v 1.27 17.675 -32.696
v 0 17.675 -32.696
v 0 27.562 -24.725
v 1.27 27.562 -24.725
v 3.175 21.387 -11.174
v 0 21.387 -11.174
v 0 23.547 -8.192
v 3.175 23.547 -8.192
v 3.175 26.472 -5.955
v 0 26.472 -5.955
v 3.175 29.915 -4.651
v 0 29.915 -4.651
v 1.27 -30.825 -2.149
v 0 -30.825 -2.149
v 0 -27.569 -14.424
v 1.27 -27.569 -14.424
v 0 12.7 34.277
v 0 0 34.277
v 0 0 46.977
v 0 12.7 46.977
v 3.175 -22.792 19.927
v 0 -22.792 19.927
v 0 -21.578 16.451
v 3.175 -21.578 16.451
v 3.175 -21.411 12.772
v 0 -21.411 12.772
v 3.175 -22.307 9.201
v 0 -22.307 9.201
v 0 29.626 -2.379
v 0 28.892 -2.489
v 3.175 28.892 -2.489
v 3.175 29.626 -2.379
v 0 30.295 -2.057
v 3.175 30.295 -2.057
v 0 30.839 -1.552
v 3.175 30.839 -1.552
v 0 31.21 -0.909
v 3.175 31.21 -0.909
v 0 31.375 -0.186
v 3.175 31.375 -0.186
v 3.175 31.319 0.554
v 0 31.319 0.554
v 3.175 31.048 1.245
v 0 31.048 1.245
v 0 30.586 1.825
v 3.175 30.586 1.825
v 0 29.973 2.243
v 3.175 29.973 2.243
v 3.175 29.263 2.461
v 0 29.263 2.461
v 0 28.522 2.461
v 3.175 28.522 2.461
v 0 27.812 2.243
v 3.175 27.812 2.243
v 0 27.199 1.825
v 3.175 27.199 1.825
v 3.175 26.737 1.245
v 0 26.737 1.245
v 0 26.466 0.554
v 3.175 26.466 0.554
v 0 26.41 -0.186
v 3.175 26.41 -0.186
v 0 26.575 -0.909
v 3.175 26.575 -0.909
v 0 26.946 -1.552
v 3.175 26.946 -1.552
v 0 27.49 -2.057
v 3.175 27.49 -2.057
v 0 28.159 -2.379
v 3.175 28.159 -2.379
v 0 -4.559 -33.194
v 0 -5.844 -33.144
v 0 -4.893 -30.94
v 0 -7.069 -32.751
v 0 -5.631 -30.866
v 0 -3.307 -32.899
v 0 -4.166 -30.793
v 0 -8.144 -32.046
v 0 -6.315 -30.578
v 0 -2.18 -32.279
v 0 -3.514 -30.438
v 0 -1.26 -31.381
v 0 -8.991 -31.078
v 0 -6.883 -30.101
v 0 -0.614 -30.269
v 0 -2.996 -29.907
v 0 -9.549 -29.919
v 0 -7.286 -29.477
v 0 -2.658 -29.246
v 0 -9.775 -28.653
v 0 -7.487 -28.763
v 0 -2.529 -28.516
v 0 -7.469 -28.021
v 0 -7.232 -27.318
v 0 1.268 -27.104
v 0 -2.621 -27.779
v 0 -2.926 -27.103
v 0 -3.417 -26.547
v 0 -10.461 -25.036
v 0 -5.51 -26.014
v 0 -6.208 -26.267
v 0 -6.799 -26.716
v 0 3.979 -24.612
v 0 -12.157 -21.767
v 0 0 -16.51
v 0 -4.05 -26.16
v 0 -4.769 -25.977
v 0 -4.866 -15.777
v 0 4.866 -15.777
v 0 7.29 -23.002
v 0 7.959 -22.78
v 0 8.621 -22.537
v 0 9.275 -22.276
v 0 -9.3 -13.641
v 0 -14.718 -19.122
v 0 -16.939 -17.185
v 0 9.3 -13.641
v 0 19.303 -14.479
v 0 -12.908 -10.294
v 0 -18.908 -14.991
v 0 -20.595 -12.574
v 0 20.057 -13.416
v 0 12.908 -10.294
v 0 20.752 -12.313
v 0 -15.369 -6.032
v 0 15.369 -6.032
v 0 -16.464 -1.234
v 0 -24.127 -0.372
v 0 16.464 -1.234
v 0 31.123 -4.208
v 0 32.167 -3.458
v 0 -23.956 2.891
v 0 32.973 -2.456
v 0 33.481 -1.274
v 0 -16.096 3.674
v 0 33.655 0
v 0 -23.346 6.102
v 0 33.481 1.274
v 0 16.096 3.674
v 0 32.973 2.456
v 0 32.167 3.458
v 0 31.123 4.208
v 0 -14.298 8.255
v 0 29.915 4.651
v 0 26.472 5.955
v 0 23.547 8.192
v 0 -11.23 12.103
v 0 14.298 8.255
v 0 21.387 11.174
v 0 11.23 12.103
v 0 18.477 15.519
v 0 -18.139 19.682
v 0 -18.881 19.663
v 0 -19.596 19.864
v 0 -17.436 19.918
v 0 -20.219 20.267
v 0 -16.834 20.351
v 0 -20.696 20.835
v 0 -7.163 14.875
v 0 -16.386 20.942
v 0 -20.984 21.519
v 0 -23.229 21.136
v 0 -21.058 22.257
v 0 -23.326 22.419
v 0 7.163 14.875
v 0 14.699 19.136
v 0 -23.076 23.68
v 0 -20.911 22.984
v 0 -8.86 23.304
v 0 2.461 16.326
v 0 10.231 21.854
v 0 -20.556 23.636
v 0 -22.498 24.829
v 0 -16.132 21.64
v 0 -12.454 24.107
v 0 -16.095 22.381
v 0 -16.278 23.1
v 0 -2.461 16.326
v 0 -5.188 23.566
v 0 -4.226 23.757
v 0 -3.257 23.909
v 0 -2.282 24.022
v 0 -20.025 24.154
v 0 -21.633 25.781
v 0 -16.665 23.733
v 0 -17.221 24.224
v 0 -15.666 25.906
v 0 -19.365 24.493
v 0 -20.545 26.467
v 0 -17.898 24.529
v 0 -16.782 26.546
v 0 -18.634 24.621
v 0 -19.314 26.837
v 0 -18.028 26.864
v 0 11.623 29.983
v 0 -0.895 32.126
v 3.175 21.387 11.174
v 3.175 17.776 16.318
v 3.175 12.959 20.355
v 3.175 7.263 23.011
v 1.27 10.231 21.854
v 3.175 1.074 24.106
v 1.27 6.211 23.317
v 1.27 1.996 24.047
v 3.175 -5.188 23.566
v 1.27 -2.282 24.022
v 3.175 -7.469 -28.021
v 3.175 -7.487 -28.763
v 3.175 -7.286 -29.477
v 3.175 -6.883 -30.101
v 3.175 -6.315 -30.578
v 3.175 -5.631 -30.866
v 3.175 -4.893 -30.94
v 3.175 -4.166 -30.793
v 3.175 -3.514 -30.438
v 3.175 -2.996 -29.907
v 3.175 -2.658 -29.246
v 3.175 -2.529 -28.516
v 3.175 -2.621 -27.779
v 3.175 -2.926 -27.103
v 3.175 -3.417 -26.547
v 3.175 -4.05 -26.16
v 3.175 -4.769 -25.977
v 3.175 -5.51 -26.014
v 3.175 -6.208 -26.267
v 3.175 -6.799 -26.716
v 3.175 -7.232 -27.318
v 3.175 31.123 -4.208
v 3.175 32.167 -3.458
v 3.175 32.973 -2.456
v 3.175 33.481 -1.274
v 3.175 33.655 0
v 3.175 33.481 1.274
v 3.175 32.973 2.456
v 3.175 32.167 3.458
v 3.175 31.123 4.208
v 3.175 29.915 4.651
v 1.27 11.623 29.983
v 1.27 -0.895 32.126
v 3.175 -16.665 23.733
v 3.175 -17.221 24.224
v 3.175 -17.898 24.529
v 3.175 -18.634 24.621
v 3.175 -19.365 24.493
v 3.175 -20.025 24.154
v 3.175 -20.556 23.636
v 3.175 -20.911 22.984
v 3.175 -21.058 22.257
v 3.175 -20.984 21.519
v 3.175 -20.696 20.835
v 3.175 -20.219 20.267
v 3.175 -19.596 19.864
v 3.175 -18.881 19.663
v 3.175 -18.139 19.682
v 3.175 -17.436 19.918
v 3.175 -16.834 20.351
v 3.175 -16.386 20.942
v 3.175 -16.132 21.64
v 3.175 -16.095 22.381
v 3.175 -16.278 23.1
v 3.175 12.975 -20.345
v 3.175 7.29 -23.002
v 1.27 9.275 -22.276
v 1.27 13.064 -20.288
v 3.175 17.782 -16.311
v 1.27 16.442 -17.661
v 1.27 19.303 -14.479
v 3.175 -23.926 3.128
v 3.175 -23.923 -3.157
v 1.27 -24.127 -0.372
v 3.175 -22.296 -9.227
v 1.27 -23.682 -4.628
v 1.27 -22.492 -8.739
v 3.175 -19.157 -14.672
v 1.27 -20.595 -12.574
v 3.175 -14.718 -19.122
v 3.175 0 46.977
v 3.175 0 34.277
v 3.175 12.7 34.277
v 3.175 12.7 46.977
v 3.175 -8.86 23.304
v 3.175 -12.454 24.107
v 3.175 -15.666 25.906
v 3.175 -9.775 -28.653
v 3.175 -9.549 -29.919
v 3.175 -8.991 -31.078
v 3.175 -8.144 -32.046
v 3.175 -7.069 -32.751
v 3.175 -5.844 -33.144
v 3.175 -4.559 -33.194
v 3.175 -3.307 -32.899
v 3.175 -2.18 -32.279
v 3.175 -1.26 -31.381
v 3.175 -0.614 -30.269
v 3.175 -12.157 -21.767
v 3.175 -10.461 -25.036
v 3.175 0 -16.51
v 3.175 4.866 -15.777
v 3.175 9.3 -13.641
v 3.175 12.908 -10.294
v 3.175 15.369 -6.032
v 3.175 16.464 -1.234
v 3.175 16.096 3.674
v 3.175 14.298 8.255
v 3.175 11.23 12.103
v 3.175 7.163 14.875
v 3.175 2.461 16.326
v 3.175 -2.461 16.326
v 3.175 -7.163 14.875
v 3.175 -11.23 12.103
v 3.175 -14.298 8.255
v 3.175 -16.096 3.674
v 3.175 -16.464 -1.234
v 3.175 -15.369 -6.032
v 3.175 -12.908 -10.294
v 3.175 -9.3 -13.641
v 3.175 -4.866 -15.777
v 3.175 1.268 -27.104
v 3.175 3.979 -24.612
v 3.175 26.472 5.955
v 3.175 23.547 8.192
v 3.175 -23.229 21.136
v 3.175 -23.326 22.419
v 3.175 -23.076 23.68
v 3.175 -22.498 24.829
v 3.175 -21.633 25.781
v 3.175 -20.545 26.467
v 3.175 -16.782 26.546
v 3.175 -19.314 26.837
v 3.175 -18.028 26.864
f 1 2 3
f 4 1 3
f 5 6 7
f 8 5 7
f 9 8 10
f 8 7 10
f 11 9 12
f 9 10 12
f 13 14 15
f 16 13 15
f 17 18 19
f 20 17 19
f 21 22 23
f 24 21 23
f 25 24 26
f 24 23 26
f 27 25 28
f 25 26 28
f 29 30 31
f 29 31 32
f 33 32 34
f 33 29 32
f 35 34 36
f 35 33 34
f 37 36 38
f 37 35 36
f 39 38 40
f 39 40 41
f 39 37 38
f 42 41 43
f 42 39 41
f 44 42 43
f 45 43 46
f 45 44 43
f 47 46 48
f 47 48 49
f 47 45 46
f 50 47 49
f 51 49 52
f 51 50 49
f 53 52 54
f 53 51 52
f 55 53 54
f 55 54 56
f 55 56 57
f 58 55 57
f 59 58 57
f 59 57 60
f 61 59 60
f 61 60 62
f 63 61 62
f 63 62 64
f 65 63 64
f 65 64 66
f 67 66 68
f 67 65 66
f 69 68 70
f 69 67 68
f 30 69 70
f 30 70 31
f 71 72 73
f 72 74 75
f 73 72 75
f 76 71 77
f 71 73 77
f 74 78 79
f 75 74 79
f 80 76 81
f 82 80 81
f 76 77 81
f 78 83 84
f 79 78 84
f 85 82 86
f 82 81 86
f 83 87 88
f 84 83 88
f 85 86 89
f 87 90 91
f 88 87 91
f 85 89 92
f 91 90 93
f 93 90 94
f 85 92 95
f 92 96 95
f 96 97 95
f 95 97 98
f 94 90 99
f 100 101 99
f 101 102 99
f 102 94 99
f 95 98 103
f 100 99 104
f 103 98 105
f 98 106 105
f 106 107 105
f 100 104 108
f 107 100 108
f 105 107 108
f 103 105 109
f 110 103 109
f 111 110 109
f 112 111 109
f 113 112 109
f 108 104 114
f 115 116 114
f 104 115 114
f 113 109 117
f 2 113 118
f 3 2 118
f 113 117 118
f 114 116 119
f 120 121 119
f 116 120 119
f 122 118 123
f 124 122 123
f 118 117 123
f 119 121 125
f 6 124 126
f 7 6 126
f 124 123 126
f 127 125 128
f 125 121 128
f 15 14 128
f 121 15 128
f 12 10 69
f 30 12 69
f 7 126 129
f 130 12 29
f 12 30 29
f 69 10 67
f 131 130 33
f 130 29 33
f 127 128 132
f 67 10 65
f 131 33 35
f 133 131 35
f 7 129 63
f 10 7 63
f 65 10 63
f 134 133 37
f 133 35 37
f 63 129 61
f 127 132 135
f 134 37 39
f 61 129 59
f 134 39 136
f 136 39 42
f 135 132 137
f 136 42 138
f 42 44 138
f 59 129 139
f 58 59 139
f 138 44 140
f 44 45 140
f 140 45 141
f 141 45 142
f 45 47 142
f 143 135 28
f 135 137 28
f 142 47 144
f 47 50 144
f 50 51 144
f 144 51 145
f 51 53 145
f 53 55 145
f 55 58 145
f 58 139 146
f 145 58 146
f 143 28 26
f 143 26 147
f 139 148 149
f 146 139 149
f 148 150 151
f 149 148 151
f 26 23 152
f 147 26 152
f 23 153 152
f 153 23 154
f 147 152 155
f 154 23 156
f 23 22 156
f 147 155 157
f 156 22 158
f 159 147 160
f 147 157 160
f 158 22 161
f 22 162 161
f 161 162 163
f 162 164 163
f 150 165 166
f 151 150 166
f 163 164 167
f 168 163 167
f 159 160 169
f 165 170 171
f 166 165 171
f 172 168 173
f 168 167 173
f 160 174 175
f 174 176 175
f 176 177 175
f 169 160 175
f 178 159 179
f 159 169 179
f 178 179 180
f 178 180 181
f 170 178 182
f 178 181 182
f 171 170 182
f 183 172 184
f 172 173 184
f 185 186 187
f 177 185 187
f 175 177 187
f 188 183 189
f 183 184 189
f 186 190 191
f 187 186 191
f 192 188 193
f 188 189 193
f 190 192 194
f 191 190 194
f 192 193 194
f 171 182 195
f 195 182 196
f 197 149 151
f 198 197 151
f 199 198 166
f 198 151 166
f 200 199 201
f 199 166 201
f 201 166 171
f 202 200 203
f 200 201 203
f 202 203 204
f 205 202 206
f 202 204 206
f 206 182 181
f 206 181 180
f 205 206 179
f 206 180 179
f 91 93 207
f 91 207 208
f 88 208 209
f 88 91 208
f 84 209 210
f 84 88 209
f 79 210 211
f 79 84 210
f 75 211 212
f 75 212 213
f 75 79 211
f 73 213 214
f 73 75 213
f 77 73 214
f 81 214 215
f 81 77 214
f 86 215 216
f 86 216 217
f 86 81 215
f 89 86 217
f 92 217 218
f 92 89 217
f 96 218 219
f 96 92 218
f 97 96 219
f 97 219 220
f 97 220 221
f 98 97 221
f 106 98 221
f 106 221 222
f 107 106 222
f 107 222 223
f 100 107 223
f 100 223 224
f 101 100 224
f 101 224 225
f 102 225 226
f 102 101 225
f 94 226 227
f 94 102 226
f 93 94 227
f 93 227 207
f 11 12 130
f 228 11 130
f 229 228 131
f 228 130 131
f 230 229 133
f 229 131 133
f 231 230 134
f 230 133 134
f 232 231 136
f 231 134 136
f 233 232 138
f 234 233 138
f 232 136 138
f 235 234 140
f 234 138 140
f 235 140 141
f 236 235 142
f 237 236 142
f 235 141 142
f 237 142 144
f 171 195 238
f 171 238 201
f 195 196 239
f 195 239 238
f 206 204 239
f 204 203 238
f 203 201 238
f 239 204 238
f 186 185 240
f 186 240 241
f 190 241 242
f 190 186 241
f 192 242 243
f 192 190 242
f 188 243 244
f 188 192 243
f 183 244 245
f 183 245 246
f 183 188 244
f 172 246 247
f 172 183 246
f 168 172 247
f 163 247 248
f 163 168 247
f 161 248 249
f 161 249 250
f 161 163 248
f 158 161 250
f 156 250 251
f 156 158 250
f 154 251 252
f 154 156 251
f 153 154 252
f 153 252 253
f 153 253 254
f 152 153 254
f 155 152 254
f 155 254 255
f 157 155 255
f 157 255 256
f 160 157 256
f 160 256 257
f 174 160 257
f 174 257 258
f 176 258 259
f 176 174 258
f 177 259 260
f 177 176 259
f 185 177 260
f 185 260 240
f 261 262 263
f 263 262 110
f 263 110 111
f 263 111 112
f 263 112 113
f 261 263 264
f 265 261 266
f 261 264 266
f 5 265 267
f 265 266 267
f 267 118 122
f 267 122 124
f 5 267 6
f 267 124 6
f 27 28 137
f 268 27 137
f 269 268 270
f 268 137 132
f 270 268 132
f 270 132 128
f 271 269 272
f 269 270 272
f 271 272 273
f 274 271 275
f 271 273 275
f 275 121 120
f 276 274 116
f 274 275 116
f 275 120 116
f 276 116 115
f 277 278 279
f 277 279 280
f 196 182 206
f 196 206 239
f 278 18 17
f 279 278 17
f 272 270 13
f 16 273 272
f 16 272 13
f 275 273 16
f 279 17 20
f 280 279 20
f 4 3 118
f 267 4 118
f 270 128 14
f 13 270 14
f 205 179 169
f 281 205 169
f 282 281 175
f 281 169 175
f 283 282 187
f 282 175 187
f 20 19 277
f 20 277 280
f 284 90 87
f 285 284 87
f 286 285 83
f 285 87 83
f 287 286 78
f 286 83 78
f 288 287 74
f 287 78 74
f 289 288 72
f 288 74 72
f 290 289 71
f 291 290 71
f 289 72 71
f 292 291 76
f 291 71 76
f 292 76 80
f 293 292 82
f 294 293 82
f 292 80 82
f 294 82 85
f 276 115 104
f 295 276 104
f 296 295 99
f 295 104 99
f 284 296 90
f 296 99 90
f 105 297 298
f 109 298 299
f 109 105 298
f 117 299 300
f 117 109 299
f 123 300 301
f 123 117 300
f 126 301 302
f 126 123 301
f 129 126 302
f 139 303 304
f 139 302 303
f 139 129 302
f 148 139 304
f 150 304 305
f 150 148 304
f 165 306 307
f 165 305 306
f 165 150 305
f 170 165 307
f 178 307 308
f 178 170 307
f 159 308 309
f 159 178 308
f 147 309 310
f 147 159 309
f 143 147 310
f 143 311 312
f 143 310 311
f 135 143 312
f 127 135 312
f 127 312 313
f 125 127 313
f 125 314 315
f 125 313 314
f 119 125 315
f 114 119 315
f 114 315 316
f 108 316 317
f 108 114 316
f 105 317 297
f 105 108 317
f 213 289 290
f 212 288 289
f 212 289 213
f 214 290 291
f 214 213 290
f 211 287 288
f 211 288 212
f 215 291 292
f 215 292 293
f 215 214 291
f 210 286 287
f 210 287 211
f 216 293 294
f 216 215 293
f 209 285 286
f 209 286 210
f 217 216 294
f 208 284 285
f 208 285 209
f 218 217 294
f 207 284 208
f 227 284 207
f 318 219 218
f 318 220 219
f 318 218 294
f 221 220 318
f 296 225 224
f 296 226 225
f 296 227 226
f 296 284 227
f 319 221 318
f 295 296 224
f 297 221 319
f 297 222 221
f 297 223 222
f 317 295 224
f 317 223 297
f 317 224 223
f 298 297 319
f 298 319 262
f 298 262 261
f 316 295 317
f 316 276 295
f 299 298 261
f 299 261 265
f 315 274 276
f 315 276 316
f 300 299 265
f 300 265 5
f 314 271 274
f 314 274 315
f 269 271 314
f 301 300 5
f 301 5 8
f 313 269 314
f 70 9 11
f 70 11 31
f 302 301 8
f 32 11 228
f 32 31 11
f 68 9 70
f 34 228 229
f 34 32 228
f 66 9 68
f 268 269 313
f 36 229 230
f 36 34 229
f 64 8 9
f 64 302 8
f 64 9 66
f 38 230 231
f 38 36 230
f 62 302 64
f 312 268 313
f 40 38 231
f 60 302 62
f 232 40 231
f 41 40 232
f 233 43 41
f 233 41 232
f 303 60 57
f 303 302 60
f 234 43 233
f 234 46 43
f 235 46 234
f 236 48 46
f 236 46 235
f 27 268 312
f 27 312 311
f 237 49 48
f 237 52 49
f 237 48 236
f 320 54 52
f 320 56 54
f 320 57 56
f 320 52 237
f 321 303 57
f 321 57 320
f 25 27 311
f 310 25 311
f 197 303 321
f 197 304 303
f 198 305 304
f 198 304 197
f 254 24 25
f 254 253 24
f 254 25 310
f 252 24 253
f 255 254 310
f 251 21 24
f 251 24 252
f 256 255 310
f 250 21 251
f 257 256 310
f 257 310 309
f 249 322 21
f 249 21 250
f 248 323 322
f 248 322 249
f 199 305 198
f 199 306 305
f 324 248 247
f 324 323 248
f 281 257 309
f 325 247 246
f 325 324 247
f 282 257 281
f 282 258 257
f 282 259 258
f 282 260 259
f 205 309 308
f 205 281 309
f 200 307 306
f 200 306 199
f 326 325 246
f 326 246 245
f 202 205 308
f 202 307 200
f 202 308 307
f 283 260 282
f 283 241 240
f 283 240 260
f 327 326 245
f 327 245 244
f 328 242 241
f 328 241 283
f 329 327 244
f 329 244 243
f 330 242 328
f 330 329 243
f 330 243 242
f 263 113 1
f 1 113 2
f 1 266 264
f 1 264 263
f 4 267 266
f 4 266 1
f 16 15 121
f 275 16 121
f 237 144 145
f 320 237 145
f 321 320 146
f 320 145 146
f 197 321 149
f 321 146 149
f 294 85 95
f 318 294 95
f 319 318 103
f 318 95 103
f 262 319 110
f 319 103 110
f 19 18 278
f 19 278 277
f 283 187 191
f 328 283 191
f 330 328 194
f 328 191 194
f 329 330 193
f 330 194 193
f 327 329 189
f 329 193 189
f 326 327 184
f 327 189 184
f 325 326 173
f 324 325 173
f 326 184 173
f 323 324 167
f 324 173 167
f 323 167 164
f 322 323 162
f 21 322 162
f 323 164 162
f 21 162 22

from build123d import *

# Parameters (mm, degrees)
SKETCH1_R           = 16.51
SKETCH1_R_2         = 2.4892
BOSS_EXTRUDE1_DEPTH = 3.175
CIRPATTERN1_COUNT   = 3
CIRPATTERN1_ANGLE   = 260
SKETCH2_W           = 12.7
SKETCH2_H           = 12.7
BOSS_EXTRUDE2_DEPTH = 3.175
BOSS_EXTRUDE3_DEPTH = 1.27


with BuildPart() as part:
    # Sketch1 → Boss-Extrude1 (new body)
    with BuildSketch(Plane(origin=(0, 0, 0), x_dir=(0, 0, -1), z_dir=(1, 0, 0))):
        with BuildLine():
            ThreePointArc((4.651349482, 29.915414585), (0, 33.655), (-4.651349482, 29.915414585))
            ThreePointArc((-4.651349482, 29.915414585), (-6.967053747, 24.927981855), (-11.173931514, 21.386915498))
            ThreePointArc((-11.173931514, 21.386915498), (0, -24.13), (11.173931514, 21.386915498))
            ThreePointArc((11.173931514, 21.386915498), (6.967053747, 24.927981855), (4.651349482, 29.915414585))
        make_face()
        Circle(SKETCH1_R, mode=Mode.SUBTRACT)
        with Locations((0, 28.8925)):
            Circle(SKETCH1_R_2, mode=Mode.SUBTRACT)
    extrude(amount=BOSS_EXTRUDE1_DEPTH)


with BuildPart() as cirpattern1_1:
    # CirPattern1: pattern copy
    add(part.part.rotate(Axis((0, 0, 0), (1, 0, 0)), 1 * CIRPATTERN1_ANGLE / (CIRPATTERN1_COUNT - 1)))


with BuildPart() as cirpattern1_2:
    # CirPattern1: pattern copy
    add(part.part.rotate(Axis((0, 0, 0), (1, 0, 0)), 2 * CIRPATTERN1_ANGLE / (CIRPATTERN1_COUNT - 1)))


with BuildPart() as part_1:
    add(part.part)

    # Combine1: read off the stored shape, not the designer's step
    # Combine1: union CirPattern1_2, CirPattern1_1
    add(cirpattern1_2.part)
    add(cirpattern1_1.part)

    # Sketch3 → Boss-Extrude3 (add)
    with BuildSketch(Plane.ZY):
        Polygon((-14.016942068, 18.930096526), (-21.987546991, 9.042758303), (-32.695735298, 17.675085478), (-24.725130374, 27.562423702), align=None)
        Polygon((20.292858755, 9.964170469), (22.435967923, -2.55370008), (32.12580998, -0.894760626), (29.982700812, 11.623109924), align=None)
        Polygon((-12.229834857, -19.295325852), (0.045762794, -22.551044254), (-2.148676213, -30.82511682), (-14.424273863, -27.569398418), align=None)
    extrude(amount=-BOSS_EXTRUDE3_DEPTH)


with BuildPart() as body_2:
    # Sketch2 → Boss-Extrude2 (new body)
    with BuildSketch(Plane.ZY):
        with Locations((40.626865076, 6.35)):
            Rectangle(SKETCH2_W, SKETCH2_H)
    extrude(amount=-BOSS_EXTRUDE2_DEPTH)


solid = Compound([part_1.part, body_2.part])
